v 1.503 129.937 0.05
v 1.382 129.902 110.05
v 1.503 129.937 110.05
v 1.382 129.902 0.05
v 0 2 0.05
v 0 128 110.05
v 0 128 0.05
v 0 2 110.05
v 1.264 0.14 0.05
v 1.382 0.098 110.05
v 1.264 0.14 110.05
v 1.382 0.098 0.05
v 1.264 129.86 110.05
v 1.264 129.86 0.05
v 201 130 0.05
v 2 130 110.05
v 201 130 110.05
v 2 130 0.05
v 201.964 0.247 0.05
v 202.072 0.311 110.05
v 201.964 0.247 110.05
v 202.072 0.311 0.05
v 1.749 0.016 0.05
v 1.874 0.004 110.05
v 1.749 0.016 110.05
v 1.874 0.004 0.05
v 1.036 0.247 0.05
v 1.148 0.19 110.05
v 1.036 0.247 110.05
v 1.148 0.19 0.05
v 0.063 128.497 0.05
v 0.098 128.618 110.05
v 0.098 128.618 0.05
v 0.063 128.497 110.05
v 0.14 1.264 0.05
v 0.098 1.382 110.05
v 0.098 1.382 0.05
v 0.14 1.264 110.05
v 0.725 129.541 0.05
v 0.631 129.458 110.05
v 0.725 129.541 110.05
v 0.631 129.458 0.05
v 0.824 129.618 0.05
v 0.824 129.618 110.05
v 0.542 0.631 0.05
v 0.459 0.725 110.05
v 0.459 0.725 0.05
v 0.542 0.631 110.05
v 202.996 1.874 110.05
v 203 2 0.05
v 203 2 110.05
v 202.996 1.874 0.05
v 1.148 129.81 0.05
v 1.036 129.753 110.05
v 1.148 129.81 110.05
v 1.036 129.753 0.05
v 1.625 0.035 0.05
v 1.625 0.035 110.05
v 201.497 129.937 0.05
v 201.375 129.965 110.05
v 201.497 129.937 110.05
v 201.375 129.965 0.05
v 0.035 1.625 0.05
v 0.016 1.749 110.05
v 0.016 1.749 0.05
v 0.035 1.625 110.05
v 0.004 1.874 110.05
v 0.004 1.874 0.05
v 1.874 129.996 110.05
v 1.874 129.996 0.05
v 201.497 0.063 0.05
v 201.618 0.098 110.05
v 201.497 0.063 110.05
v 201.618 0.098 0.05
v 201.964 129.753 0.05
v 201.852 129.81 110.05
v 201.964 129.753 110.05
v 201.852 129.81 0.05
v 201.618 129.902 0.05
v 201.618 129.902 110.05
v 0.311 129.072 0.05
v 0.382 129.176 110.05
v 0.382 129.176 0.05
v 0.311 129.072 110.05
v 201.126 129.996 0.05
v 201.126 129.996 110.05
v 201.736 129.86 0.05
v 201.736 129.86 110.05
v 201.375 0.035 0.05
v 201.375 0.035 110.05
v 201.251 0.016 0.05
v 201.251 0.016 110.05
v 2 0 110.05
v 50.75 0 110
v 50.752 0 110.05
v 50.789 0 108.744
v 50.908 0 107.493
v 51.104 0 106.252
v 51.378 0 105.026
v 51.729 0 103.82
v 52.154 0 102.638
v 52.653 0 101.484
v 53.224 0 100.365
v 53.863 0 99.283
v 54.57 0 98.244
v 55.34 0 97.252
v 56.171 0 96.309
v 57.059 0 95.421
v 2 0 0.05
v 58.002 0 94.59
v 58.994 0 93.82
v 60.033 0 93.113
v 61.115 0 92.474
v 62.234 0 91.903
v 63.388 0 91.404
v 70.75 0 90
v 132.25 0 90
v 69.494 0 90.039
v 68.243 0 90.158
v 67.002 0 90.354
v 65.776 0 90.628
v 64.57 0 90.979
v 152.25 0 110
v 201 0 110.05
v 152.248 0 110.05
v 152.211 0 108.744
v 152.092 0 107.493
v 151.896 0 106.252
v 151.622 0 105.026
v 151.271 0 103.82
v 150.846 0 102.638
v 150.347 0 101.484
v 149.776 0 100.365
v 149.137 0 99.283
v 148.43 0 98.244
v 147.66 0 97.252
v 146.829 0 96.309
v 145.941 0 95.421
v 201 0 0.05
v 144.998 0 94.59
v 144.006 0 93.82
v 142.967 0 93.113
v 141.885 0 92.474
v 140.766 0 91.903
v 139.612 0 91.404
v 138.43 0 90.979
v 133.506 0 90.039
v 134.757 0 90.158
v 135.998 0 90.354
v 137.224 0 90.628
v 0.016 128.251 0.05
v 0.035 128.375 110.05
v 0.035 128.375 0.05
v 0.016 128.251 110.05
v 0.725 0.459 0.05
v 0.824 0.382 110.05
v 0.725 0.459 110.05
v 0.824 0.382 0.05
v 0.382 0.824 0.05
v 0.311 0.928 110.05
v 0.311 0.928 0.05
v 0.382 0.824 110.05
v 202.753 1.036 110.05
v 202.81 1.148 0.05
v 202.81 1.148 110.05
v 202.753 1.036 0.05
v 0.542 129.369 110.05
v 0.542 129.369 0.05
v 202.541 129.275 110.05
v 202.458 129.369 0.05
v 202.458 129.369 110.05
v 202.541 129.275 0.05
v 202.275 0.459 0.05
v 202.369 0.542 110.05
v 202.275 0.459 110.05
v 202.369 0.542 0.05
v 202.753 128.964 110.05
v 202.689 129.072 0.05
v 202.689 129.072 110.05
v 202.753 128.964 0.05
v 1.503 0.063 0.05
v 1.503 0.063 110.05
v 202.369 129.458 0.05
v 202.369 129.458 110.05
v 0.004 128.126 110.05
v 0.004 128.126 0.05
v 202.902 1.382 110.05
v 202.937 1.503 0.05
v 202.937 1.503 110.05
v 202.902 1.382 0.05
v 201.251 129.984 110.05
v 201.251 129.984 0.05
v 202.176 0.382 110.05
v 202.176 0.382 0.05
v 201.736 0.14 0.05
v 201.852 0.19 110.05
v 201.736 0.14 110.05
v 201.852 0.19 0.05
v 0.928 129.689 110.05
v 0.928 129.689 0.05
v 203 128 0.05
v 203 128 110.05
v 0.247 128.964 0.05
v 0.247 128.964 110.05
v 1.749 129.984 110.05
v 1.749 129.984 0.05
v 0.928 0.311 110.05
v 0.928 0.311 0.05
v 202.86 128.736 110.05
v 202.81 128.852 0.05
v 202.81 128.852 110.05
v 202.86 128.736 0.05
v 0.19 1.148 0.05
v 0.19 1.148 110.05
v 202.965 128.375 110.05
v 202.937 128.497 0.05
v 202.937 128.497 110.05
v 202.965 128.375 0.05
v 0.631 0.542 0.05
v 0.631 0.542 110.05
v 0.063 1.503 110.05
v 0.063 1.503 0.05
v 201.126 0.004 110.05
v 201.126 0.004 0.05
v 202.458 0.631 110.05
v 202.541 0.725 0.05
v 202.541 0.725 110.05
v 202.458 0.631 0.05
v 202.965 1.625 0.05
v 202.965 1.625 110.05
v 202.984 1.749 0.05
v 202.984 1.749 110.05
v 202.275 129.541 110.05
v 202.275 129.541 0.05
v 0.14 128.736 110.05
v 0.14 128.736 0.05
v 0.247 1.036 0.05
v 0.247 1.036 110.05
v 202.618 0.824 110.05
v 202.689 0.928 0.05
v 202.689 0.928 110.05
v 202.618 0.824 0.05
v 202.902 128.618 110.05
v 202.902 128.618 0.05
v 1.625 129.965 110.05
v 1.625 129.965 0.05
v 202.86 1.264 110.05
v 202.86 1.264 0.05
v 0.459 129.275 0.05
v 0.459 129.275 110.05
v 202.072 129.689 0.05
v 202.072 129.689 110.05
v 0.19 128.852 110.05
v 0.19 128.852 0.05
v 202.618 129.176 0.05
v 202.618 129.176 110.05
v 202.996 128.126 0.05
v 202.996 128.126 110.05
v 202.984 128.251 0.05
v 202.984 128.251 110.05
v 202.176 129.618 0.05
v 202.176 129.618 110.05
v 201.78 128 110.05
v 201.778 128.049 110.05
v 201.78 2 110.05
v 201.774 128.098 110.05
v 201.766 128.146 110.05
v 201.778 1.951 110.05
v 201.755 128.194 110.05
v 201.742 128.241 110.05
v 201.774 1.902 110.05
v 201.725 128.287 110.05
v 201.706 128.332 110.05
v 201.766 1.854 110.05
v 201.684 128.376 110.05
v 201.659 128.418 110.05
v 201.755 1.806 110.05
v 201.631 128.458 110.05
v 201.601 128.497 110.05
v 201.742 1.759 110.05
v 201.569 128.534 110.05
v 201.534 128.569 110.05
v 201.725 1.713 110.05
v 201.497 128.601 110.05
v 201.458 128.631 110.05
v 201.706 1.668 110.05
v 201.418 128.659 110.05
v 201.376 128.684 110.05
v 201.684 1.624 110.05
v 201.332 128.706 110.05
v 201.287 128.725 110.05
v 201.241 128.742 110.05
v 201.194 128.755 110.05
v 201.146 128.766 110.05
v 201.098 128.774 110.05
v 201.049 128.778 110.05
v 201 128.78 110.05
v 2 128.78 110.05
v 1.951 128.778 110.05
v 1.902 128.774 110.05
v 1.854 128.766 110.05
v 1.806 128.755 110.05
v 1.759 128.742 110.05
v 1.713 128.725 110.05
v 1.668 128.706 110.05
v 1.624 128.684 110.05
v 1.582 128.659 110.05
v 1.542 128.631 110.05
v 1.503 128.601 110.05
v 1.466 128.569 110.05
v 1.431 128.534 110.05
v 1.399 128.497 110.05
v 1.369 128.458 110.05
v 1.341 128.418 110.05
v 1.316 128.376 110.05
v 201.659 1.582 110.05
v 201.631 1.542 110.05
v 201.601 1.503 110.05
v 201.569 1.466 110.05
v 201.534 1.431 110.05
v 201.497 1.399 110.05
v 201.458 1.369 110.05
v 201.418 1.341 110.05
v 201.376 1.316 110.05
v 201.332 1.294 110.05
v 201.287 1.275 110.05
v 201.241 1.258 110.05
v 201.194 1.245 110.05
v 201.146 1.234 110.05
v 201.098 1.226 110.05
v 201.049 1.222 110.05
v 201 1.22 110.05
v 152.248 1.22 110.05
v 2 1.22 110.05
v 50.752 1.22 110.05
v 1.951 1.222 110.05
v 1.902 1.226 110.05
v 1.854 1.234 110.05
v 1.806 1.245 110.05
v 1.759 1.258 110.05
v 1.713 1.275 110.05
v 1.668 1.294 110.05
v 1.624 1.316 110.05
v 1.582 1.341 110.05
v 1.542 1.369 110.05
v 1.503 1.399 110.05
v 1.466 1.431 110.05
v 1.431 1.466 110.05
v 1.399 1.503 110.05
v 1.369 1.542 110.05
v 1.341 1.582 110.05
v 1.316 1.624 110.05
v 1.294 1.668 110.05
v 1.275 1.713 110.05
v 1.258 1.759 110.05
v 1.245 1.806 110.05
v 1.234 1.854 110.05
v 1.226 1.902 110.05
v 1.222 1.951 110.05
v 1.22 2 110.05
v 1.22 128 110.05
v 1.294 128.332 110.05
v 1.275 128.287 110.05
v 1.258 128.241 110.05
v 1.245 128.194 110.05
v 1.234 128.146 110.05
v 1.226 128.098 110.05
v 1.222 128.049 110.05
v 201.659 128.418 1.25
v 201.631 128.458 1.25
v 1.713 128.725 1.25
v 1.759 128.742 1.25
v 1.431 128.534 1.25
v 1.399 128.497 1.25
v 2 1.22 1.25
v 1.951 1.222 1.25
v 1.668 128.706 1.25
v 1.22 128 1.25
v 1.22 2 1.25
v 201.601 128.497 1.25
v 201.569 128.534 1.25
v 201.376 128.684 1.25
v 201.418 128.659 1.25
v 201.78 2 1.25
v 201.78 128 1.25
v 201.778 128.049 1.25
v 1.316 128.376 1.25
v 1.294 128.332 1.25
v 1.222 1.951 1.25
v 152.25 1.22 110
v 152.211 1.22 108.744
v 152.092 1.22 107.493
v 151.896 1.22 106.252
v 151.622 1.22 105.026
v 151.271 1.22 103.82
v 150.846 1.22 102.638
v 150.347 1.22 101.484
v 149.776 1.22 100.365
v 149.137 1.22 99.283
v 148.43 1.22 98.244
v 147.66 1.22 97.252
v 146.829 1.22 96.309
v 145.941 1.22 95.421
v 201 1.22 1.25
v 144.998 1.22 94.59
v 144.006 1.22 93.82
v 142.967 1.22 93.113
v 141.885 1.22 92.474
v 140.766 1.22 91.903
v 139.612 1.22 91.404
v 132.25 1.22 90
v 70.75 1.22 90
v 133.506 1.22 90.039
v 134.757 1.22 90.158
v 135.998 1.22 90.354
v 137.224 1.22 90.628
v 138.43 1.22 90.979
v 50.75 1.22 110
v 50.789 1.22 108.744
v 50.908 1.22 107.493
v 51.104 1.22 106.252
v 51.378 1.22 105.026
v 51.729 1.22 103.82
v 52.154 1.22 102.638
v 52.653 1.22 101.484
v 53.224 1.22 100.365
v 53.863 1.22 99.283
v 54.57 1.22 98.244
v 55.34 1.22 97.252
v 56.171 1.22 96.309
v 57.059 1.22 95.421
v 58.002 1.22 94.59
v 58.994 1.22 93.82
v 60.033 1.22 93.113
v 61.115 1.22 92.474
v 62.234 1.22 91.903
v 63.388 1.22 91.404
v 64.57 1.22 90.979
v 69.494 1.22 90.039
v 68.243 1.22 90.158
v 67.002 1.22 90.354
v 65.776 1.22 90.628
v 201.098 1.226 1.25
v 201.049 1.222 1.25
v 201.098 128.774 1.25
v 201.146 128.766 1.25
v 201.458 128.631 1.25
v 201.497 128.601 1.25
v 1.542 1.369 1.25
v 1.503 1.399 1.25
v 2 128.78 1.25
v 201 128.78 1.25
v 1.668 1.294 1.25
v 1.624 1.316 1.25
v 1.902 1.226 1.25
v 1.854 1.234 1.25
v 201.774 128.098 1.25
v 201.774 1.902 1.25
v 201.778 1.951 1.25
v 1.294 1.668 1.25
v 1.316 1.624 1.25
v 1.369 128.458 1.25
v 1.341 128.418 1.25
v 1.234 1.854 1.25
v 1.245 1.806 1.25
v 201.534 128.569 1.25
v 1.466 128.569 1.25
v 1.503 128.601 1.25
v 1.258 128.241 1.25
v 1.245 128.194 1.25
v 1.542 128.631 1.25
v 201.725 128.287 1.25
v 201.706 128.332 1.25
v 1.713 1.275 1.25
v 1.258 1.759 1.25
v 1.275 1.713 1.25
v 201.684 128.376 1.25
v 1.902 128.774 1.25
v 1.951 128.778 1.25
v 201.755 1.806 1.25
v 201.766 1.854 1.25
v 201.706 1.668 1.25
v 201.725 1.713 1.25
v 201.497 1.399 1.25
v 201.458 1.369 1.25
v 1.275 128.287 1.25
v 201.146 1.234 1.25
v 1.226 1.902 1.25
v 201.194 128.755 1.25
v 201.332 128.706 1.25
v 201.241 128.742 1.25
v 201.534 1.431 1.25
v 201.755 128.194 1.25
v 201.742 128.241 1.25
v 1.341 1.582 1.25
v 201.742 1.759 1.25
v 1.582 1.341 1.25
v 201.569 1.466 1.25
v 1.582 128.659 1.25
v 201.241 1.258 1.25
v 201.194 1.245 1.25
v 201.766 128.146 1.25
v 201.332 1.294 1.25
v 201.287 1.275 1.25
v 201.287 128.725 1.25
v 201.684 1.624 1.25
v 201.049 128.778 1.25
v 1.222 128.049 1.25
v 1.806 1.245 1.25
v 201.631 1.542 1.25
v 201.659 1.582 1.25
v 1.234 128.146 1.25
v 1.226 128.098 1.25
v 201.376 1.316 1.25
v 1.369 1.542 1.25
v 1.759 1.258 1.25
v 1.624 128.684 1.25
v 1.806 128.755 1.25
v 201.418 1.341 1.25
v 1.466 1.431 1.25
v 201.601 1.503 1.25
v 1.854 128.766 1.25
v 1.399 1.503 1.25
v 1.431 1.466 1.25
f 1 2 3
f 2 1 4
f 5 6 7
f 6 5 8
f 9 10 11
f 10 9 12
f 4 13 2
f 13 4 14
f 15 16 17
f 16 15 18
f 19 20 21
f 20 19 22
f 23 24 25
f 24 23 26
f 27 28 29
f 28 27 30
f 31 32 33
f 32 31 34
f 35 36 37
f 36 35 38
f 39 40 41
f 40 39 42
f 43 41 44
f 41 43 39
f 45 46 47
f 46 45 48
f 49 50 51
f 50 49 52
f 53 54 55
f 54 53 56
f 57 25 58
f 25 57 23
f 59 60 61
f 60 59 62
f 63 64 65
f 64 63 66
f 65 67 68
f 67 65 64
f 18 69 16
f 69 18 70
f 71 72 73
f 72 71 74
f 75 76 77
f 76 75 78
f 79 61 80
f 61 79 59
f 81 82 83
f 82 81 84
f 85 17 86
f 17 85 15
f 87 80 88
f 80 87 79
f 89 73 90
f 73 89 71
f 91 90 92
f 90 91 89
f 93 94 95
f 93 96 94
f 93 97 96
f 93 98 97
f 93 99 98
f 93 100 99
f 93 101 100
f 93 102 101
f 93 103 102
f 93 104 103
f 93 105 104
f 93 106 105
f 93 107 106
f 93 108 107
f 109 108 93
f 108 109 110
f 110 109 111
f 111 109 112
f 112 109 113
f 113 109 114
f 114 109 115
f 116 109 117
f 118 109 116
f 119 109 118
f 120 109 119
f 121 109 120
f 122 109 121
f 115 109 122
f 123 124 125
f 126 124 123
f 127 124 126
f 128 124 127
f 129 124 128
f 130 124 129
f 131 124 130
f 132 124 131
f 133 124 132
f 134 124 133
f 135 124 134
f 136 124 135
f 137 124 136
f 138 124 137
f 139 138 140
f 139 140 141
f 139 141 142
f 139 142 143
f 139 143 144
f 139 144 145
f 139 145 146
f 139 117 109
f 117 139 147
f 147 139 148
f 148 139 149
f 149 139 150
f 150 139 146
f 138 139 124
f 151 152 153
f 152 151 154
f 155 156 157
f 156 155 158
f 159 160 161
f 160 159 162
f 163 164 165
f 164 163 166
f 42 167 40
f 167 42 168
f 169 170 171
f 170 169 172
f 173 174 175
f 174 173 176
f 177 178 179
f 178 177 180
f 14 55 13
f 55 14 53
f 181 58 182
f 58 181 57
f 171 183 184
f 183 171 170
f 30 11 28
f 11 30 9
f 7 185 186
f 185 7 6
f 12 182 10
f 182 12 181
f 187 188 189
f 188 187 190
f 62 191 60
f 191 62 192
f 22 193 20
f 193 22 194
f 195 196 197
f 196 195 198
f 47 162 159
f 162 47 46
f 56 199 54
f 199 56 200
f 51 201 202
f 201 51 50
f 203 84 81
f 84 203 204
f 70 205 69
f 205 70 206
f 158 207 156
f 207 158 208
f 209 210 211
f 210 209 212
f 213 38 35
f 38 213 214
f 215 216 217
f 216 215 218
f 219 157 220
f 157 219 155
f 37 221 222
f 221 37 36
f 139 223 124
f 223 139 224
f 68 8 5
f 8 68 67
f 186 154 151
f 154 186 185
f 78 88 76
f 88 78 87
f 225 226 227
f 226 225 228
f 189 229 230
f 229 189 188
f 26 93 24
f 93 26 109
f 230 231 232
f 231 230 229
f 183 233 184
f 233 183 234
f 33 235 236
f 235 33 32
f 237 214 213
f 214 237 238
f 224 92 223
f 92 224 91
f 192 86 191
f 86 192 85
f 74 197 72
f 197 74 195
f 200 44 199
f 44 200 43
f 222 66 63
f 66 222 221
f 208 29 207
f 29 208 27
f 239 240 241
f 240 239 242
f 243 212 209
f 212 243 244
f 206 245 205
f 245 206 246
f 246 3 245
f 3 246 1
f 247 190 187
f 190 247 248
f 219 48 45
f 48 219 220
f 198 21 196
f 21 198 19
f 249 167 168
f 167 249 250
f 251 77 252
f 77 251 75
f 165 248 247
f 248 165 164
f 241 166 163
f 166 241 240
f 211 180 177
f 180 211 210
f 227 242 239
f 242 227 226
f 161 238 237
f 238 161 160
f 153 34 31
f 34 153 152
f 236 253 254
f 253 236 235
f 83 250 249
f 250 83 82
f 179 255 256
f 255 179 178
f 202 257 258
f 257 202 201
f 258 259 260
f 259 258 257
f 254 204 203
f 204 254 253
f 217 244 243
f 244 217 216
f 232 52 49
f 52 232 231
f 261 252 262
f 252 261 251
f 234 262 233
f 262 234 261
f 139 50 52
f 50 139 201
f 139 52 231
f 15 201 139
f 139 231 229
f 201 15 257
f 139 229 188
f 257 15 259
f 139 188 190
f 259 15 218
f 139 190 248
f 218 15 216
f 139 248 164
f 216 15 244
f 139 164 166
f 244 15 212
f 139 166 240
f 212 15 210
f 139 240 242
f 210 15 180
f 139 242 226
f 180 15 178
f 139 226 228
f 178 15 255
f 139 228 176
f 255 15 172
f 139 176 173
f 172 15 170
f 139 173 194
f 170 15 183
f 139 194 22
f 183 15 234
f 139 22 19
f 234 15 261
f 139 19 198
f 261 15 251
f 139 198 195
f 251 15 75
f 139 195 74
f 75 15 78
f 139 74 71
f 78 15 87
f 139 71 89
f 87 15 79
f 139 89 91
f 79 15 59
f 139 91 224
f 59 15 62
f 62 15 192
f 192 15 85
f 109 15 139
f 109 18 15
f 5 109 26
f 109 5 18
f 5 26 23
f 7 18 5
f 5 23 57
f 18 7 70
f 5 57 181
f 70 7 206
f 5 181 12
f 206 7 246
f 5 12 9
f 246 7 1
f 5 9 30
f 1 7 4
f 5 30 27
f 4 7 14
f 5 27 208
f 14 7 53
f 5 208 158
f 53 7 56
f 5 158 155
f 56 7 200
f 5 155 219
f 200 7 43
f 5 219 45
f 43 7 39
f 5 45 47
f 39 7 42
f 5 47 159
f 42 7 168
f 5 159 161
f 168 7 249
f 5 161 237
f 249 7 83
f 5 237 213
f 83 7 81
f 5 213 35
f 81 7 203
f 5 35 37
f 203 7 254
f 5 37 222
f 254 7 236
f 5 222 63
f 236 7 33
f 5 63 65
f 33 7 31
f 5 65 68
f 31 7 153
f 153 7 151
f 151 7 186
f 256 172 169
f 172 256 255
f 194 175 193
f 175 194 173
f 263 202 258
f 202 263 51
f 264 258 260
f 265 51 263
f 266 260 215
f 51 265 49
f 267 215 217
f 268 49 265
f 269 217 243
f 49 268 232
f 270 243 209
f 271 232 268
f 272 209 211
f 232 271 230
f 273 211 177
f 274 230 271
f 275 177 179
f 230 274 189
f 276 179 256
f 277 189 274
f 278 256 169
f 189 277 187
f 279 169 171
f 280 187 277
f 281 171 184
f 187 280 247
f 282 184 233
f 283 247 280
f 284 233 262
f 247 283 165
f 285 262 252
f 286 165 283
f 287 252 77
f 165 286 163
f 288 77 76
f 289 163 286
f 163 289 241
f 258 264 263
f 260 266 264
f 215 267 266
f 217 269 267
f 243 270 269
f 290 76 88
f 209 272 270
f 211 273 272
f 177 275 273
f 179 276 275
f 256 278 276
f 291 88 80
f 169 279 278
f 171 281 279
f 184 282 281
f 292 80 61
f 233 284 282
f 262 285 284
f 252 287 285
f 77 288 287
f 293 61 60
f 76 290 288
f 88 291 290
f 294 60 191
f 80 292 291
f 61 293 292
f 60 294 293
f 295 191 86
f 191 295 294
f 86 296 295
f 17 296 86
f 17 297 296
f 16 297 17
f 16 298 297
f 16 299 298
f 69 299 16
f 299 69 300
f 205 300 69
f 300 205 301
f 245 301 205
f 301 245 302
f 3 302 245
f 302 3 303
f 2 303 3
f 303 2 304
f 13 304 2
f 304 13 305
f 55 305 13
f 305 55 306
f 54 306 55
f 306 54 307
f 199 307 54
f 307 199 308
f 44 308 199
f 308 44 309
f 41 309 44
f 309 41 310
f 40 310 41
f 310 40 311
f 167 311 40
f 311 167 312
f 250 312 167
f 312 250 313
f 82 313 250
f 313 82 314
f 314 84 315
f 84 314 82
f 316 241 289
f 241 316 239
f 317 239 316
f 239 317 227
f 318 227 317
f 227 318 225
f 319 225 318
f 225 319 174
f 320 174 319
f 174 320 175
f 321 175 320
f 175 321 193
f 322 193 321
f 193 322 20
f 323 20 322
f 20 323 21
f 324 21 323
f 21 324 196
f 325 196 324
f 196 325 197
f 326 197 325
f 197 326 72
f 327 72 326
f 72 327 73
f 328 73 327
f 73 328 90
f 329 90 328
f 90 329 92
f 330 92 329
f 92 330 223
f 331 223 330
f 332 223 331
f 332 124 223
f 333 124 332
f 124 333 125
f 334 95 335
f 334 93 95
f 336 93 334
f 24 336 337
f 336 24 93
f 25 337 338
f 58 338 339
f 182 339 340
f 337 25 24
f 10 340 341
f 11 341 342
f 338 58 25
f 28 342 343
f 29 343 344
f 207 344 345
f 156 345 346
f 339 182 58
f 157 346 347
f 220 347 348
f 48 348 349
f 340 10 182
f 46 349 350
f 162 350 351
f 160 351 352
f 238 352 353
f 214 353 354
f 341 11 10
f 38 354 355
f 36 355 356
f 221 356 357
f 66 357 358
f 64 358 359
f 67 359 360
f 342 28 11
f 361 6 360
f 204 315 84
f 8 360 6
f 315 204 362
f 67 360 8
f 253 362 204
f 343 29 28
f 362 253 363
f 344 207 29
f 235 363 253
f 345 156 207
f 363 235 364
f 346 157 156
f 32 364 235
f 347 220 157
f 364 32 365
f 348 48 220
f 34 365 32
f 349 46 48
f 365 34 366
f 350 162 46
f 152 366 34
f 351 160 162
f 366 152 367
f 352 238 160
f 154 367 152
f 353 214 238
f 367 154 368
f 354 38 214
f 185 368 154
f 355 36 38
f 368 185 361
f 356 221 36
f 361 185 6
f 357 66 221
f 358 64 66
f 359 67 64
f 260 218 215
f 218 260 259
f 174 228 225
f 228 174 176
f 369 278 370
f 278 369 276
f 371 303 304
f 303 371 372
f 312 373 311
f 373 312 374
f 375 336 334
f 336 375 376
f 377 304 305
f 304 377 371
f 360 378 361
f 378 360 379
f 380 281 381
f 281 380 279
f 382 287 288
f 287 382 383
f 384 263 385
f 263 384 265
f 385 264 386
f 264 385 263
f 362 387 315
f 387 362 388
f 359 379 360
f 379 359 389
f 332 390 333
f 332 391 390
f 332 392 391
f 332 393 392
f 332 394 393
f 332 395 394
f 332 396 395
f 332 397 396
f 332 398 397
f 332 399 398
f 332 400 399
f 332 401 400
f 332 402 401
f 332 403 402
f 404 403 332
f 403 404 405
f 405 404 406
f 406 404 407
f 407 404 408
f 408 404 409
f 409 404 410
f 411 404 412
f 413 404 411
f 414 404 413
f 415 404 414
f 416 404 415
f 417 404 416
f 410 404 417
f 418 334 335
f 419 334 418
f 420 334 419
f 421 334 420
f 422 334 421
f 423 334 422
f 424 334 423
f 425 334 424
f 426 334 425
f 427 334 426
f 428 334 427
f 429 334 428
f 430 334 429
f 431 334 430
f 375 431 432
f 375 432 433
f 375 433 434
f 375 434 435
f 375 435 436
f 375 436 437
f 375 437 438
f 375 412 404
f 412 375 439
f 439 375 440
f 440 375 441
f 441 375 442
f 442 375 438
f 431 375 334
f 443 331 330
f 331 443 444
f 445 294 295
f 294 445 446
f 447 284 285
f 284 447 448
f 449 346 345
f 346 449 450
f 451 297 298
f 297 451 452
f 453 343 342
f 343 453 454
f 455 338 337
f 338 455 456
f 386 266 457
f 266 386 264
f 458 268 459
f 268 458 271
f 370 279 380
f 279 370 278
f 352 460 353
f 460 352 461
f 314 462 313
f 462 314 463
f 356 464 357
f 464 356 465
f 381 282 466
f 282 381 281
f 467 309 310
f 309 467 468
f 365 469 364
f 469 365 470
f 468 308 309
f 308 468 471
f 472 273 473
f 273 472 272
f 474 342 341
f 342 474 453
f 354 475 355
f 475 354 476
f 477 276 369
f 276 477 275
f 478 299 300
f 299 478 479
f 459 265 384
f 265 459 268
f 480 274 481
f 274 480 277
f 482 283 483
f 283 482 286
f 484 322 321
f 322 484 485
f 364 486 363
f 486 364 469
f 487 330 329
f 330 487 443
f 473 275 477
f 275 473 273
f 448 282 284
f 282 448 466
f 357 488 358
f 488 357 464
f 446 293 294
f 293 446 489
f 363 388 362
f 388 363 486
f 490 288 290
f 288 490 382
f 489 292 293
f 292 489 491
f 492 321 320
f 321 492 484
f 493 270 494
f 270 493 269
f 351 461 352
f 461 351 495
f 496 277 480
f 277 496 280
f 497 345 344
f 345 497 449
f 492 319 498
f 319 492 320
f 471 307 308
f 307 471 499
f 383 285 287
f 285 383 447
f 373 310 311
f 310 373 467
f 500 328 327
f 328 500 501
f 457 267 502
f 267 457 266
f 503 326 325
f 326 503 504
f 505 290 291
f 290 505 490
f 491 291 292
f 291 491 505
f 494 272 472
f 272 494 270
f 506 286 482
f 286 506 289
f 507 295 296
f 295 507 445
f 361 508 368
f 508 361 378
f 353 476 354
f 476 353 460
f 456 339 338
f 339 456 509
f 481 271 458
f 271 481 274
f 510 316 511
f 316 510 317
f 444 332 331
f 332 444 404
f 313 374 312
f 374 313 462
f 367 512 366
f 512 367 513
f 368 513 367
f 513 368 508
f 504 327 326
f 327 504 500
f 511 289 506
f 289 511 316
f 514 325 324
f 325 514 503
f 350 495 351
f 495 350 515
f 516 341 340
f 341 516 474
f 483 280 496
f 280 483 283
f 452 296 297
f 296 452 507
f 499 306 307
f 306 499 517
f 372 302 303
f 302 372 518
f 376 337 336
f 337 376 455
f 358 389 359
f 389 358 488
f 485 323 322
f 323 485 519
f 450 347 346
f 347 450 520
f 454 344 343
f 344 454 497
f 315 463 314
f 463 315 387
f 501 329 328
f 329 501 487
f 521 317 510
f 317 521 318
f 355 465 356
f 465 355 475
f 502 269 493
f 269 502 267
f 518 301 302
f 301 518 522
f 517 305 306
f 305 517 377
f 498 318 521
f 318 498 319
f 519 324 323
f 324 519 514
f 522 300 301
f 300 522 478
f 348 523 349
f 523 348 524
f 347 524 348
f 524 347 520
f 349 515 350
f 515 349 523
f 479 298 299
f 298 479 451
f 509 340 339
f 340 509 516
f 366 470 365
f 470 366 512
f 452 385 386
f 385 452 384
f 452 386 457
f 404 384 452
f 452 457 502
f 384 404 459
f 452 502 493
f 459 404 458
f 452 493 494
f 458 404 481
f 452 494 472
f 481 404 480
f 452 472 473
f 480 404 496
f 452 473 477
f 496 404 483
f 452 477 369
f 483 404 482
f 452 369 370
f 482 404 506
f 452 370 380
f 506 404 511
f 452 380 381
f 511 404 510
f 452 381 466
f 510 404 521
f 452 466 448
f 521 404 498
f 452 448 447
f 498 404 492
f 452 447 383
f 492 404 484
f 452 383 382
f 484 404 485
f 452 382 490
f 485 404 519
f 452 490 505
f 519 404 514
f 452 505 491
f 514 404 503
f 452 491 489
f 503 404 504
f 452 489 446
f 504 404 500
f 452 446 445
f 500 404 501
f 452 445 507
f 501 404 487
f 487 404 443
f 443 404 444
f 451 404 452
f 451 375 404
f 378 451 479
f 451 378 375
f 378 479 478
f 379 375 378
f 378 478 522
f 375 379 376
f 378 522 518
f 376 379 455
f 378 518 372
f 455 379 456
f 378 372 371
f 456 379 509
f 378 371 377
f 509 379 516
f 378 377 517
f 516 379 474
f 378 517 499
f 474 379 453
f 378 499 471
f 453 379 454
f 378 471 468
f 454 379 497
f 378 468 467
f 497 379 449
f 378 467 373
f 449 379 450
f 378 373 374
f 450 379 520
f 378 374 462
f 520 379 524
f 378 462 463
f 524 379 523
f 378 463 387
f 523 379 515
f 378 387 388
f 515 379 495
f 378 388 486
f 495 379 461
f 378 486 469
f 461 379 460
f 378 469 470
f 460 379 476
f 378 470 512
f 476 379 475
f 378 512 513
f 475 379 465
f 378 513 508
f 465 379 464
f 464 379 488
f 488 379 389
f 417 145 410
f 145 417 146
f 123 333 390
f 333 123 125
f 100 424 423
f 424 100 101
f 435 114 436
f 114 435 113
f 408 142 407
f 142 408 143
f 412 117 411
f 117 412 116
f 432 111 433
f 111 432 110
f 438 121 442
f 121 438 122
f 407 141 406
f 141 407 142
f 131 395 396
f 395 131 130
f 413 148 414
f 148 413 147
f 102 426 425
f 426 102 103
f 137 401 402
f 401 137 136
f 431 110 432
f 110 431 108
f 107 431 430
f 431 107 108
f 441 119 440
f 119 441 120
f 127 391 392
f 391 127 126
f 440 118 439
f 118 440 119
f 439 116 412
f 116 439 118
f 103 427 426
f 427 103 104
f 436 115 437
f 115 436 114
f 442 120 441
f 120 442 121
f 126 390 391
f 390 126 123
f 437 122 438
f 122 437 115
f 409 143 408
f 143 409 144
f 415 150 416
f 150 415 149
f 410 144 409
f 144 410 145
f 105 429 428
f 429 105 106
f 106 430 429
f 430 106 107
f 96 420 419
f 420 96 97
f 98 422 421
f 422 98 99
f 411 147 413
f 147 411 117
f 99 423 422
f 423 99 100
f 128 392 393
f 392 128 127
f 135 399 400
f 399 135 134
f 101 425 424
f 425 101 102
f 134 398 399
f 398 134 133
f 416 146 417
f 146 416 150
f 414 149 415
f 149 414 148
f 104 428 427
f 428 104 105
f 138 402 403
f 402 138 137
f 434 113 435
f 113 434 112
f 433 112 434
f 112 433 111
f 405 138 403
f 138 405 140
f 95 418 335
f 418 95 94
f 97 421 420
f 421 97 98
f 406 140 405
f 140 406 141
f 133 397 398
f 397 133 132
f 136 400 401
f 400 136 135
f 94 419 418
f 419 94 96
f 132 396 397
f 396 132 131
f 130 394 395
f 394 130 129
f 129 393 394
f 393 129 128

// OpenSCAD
extrusion_width=1.22;
layer_height=0.4;
wall=extrusion_width;
base=layer_height*3;
corner=2;
x=203;
y=130;
z=110;
handle=x/2;
handle_h=20;
pad=0.1;
$fn=100;

difference() {
    translate([corner,corner,pad/2])
    minkowski() {
        cube([x-corner*2,y-corner*2,z-pad]);
        cylinder(r=corner,h=pad);
    }
    translate([corner,corner,pad/2+base])
    minkowski() {
        cube([x-corner*2,y-corner*2,z-base+pad]);
        cylinder(r=corner-wall,h=pad);
    }

    hull() {
        translate([(x-handle)/2+handle_h,0,z])
        rotate([-90,0,0])
        translate([0,0,-wall/2])
        cylinder(r=handle_h,h=wall*2);

        translate([(x-handle)/2+handle-handle_h,0,z])
        rotate([-90,0,0])
        translate([0,0,-wall/2])
        cylinder(r=handle_h,h=wall*2);
    }
}
